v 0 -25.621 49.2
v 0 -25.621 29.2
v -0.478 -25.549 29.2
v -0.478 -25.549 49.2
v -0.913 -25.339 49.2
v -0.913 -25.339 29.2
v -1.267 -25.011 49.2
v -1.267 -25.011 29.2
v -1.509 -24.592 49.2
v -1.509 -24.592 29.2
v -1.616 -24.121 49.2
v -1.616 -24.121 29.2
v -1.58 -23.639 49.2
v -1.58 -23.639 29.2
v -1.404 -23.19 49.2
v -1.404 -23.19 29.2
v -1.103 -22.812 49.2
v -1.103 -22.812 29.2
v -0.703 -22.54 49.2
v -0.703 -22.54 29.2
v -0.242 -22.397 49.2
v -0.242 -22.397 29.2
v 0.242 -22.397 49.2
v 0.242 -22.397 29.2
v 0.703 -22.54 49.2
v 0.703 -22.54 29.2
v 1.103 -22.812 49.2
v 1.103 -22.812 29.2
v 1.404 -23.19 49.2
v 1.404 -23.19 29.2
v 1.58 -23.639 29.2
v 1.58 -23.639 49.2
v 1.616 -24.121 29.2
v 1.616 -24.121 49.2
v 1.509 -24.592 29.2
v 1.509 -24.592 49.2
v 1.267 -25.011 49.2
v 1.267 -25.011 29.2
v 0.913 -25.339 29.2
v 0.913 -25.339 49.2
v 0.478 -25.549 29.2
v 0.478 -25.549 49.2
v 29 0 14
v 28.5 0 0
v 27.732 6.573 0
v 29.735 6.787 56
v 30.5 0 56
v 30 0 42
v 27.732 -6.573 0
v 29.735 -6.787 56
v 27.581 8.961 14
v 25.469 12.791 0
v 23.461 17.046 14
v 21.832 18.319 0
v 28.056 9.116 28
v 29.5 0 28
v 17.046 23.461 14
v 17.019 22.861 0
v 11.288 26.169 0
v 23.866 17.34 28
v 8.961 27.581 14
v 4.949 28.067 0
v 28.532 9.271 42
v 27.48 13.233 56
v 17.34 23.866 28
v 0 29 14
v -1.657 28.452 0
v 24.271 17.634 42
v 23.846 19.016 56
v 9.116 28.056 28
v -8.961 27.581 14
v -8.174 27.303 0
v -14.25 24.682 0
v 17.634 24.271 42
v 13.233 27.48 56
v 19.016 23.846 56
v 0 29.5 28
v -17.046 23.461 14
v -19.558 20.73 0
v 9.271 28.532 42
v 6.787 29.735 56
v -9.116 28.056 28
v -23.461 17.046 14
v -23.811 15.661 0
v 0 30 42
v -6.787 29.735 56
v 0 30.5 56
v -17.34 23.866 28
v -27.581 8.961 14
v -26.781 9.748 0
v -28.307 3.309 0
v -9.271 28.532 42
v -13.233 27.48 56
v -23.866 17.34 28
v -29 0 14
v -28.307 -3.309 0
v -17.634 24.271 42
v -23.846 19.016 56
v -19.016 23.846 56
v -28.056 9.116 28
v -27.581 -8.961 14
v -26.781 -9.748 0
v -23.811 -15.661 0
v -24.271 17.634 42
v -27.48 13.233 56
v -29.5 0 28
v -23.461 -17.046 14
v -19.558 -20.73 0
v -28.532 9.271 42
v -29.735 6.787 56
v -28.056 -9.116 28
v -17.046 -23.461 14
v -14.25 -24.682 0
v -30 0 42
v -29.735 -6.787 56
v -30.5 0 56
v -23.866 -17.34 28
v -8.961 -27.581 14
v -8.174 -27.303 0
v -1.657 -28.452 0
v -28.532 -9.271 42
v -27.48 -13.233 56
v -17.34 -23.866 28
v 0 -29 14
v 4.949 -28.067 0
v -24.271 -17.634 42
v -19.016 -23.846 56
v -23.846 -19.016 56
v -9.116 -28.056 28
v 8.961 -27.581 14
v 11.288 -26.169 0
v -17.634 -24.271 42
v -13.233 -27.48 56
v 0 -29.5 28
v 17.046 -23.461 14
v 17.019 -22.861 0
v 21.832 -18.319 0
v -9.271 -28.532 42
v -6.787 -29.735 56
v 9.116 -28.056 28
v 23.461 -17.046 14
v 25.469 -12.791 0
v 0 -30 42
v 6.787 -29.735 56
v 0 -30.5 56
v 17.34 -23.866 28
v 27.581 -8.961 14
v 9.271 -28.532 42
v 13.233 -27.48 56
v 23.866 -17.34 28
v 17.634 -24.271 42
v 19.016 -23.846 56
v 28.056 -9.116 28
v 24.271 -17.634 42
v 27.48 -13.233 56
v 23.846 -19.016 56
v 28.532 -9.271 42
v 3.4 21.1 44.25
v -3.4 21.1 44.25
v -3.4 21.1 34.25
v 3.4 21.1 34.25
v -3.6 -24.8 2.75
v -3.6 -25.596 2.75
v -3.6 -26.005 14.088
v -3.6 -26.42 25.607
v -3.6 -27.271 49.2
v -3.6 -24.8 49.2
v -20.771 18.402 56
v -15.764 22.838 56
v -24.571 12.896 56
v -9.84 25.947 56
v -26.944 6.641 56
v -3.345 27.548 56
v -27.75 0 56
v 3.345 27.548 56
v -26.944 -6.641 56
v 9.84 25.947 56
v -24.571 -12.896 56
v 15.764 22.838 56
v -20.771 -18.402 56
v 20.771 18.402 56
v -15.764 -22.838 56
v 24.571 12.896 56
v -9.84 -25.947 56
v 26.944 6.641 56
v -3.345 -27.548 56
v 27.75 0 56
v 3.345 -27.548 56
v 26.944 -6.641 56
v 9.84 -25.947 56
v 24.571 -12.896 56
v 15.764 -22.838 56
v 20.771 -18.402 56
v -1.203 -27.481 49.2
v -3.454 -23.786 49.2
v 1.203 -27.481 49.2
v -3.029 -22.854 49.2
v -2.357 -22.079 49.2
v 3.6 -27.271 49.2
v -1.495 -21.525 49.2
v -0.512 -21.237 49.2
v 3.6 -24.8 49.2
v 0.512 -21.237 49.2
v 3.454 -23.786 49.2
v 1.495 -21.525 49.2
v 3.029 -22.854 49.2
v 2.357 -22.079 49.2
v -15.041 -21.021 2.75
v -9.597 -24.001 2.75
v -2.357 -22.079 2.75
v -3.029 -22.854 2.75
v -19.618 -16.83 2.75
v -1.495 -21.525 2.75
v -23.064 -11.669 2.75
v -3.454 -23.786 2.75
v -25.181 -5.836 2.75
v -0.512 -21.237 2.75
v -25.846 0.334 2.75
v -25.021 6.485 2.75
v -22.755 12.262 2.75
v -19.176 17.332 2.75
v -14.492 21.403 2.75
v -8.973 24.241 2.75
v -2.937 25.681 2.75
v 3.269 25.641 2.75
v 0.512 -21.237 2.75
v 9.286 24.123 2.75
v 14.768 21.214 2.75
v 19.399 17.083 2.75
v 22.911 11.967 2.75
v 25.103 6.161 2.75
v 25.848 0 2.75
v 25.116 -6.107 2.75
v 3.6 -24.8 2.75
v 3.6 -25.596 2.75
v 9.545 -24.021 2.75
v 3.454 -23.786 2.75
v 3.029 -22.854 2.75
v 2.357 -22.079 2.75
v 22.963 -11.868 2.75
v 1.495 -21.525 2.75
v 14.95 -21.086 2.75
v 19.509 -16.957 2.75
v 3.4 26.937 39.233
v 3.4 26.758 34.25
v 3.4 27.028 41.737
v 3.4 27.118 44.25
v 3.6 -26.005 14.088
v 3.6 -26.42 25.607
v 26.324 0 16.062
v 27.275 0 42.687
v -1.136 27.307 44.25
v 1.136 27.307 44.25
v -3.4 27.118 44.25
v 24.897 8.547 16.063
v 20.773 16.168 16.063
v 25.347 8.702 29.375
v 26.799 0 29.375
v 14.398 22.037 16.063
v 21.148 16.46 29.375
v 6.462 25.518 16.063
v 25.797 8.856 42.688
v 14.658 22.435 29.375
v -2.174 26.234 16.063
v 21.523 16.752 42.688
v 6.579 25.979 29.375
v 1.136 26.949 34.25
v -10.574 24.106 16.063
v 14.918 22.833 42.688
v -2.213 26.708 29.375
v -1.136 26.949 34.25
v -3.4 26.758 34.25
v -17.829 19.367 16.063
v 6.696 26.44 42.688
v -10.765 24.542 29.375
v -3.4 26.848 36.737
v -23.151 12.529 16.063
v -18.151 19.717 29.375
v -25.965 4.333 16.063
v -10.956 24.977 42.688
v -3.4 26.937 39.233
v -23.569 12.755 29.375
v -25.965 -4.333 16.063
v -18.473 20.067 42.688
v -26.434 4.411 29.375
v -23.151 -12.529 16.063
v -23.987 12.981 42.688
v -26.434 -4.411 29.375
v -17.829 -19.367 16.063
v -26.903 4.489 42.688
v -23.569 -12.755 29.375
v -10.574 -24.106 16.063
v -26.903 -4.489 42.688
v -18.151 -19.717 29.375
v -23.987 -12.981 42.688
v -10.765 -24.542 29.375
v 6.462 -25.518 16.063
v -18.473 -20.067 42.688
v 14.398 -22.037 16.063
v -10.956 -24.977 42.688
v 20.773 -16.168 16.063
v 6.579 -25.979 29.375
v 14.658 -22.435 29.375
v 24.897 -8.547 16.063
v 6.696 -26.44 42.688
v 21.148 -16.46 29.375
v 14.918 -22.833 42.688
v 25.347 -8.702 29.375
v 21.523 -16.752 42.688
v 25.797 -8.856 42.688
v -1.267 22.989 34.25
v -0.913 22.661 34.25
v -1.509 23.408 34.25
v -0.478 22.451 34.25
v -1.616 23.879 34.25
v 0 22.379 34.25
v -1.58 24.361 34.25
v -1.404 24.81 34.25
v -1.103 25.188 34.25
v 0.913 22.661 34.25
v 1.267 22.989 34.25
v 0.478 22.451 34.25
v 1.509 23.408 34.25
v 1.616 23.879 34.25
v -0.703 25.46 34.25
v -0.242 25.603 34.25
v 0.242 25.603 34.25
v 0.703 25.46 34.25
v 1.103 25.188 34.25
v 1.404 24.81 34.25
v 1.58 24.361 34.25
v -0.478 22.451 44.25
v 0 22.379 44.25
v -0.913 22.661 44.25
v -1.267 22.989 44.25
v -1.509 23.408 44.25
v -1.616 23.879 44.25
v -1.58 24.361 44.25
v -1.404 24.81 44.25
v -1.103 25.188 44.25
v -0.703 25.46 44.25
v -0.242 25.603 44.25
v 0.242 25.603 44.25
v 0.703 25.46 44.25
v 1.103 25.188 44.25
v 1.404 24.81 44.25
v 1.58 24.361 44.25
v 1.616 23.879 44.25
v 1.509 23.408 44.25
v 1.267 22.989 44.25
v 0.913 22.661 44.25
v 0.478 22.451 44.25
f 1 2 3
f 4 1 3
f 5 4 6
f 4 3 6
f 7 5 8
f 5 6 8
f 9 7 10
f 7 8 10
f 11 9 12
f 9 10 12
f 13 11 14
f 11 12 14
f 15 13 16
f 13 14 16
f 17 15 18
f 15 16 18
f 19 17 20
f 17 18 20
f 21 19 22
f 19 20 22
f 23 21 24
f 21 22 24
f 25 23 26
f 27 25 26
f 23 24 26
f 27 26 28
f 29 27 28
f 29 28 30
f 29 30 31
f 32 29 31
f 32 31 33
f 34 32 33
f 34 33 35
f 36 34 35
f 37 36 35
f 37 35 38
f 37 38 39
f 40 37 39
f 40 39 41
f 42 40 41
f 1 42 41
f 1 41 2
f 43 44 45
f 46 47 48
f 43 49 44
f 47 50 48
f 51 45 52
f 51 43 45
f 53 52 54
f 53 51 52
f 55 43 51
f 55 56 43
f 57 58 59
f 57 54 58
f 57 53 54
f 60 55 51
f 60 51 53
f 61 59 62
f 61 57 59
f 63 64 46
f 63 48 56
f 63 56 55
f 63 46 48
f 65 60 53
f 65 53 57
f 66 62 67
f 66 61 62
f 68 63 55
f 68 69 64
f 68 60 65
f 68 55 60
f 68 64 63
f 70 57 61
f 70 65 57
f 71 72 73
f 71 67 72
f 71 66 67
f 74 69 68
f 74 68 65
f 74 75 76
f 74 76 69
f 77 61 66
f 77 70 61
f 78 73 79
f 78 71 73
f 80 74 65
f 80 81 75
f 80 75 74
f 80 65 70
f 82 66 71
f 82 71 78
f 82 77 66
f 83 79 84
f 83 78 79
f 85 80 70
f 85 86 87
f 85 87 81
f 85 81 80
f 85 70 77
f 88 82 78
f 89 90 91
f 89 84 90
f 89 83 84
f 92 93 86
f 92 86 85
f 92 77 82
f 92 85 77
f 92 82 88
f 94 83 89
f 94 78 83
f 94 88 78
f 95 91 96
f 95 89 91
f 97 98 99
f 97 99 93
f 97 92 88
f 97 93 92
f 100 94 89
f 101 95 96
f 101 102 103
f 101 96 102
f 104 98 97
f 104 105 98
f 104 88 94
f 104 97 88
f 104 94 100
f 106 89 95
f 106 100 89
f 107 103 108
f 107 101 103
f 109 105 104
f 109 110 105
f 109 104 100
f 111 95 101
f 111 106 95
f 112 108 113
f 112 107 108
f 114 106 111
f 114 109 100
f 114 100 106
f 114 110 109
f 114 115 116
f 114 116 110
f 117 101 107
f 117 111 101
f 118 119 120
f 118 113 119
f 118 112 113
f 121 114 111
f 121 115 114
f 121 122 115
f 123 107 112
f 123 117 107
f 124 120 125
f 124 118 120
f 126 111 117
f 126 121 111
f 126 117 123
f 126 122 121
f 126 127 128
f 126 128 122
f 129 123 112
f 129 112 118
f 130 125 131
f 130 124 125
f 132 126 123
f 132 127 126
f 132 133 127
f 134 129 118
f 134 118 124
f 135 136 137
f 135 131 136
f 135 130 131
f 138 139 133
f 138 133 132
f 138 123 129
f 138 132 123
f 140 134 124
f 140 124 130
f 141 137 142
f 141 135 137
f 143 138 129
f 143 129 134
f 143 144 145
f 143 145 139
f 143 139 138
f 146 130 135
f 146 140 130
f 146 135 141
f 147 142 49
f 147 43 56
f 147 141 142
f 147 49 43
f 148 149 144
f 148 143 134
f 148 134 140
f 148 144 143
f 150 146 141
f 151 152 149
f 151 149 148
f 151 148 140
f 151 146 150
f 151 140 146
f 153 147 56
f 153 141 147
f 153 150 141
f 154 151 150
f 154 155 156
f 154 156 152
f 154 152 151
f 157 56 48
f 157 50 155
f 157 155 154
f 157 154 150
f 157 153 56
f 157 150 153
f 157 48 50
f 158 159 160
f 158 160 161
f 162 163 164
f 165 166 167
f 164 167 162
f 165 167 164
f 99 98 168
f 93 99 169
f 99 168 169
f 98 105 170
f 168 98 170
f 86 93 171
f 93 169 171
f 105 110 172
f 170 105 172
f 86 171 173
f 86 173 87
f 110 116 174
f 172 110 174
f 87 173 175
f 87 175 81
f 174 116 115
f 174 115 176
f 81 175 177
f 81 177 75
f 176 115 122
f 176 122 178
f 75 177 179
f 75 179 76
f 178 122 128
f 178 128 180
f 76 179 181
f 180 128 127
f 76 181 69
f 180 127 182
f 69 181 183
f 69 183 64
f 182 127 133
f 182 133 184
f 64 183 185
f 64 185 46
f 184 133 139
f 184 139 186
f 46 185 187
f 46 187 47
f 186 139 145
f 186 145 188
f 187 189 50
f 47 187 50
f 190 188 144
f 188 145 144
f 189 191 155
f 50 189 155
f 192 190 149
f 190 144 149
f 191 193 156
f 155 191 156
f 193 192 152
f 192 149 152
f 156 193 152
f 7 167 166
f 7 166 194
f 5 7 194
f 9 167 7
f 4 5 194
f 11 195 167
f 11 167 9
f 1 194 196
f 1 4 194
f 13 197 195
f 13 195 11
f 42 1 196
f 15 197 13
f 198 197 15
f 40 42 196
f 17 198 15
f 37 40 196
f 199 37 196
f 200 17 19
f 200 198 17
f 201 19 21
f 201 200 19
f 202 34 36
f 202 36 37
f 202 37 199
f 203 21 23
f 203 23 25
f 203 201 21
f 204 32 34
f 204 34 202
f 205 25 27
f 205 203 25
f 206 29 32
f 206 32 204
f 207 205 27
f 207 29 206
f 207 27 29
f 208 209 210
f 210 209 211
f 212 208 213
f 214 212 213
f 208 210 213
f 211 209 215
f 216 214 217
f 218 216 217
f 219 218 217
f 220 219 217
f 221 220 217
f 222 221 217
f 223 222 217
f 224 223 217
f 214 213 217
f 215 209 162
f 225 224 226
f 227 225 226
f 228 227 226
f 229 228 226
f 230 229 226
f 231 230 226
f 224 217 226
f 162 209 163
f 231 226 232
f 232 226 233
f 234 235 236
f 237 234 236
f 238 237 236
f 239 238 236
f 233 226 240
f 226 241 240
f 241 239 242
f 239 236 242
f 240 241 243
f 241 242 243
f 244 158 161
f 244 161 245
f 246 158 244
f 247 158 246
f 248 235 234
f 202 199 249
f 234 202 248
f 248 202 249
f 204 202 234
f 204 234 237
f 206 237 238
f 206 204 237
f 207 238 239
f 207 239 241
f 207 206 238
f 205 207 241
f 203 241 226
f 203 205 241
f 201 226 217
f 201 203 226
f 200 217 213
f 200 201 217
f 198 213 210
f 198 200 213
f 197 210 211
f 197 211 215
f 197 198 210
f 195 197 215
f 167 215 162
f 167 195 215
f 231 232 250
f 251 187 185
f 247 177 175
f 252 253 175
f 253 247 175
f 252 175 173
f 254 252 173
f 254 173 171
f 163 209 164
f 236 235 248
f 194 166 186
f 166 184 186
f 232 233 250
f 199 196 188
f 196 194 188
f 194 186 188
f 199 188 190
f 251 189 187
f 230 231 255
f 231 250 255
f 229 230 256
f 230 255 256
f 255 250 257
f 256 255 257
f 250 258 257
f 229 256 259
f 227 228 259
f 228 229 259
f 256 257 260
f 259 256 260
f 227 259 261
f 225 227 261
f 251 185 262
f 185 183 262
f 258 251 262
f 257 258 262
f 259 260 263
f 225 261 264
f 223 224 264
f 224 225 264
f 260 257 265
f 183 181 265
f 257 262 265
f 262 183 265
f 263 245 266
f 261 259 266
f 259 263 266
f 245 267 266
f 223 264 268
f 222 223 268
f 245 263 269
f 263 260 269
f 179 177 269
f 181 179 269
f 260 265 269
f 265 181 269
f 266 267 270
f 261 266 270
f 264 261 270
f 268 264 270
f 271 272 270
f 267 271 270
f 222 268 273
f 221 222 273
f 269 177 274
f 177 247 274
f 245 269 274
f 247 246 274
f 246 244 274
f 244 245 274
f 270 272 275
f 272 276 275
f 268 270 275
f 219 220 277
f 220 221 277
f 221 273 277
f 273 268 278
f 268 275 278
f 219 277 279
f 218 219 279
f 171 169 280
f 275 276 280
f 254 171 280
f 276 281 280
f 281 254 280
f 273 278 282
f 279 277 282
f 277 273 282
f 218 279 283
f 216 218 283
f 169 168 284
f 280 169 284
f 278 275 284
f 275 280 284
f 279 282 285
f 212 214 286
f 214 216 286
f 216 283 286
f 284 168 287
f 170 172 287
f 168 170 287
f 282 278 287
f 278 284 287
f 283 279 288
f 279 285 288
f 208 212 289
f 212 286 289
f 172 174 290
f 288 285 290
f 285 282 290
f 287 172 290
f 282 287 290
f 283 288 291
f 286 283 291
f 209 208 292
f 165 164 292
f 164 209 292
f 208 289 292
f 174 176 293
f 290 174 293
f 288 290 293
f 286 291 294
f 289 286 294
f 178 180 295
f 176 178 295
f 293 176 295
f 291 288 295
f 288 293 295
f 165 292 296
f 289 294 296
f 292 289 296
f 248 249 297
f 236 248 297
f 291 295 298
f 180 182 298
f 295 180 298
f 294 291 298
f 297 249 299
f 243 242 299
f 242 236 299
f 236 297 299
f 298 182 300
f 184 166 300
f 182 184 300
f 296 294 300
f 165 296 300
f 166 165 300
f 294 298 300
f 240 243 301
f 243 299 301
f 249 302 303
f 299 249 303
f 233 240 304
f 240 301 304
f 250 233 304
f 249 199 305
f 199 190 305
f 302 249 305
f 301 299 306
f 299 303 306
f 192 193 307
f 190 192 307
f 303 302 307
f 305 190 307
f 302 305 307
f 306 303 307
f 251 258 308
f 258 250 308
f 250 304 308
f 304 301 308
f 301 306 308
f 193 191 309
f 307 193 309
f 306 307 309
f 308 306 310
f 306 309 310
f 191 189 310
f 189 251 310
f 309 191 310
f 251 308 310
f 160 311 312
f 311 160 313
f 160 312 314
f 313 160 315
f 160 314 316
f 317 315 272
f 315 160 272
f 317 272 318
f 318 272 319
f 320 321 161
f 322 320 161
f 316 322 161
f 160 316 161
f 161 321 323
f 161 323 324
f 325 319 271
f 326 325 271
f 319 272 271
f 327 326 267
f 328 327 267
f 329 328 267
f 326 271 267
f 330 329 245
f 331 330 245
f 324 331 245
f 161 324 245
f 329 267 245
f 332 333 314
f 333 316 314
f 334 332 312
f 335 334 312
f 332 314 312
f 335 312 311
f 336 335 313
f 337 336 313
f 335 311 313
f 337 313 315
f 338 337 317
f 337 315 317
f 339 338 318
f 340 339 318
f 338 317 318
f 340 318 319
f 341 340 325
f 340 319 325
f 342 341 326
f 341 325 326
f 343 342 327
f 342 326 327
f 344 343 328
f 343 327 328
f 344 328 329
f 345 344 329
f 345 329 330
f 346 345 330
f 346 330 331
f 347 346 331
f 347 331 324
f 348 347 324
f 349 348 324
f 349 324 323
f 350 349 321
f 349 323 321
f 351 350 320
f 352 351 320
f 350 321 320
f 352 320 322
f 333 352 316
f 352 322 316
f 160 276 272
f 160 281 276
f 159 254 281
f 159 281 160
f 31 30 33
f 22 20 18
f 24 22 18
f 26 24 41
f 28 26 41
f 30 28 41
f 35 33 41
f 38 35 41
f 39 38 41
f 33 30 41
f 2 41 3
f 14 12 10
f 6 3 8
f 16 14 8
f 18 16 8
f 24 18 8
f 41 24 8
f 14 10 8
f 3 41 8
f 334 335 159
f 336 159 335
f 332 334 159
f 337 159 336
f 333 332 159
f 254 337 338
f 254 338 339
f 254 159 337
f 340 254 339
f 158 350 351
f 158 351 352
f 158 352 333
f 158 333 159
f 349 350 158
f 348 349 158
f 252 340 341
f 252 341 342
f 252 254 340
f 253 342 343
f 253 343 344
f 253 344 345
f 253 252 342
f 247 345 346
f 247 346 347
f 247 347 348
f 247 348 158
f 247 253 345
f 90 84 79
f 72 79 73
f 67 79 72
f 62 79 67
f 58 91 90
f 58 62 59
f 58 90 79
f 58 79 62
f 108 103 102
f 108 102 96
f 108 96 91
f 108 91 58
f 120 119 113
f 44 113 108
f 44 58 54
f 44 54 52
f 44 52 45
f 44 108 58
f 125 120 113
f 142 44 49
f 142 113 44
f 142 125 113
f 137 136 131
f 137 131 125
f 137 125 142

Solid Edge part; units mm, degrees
sketch "Sketch1" plane through (0, 0, 0) normal (0, -1, 0) x (1, 0, 0)
  line L0 (0, 0) -> (28.5, 0)
  line L1 (28.5, 0) -> (30.5, 56)
  line L2 (30.5, 56) -> (27.75, 56)
  line L3 (27.75, 56) -> (25.8482, 2.75)
  line L4 (25.8482, 2.75) -> (0, 2.75)
  line L5 (0, 2.75) -> (0, 0)
  dimension "D1" = 28.5
  dimension "D2" = 30.5
  dimension "D3" = 56
  dimension "D4" = 27.75
revolve "RevolvedProtrusion1" add sketch "Sketch1" angle 360 about axis through (0, 0, 54) along (0, 0, -1)
sketch "Sketch2" plane through (0, 0, 44.25) normal (0, 0, 1) x (1, 0, 0)
  line L0 (-3.4, 28.2965) -> (-3.4, 21.1)
  line L1 (-3.4, 21.1) -> (3.4, 21.1)
  line L2 (3.4, 21.1) -> (3.4, 28.2965)
  line L3 (-3.4, 28.2965) -> (3.4, 28.2965)
  dimension "D1" = 6.8
  dimension "D2" = 9.4
extrude "Ausprägung_1" add sketch "Sketch2" against normal blind 10
sketch "Sketch3" plane through (0, 0, 49.2) normal (0, 0, 1) x (1, 0, 0)
  line L0 (3.6, -28.2717) -> (3.6, -24.8)
  line L1 (-3.6, -28.2717) -> (-3.6, -24.8)
  arc A0 (3.6, -24.8) -> (-3.6, -24.8) centre (0, -24.8) ccw
  line L2 (3.6, -28.2717) -> (-3.6, -28.2717)
  dimension "D1" = 9.3
  dimension "D2" = 7.2
extrude "Ausprägung_2" add sketch "Sketch3" against normal up to next
hole "Bohrung_1" at (0, 24, 49.2) direction (0, 0, -1) diameter 3.242 depth 20 thread major 4 thread length 2
hole "Hole1" at (0, -24, 49.2) direction (0, 0, -1) diameter 3.242 depth 20 thread major 4 thread length 2
